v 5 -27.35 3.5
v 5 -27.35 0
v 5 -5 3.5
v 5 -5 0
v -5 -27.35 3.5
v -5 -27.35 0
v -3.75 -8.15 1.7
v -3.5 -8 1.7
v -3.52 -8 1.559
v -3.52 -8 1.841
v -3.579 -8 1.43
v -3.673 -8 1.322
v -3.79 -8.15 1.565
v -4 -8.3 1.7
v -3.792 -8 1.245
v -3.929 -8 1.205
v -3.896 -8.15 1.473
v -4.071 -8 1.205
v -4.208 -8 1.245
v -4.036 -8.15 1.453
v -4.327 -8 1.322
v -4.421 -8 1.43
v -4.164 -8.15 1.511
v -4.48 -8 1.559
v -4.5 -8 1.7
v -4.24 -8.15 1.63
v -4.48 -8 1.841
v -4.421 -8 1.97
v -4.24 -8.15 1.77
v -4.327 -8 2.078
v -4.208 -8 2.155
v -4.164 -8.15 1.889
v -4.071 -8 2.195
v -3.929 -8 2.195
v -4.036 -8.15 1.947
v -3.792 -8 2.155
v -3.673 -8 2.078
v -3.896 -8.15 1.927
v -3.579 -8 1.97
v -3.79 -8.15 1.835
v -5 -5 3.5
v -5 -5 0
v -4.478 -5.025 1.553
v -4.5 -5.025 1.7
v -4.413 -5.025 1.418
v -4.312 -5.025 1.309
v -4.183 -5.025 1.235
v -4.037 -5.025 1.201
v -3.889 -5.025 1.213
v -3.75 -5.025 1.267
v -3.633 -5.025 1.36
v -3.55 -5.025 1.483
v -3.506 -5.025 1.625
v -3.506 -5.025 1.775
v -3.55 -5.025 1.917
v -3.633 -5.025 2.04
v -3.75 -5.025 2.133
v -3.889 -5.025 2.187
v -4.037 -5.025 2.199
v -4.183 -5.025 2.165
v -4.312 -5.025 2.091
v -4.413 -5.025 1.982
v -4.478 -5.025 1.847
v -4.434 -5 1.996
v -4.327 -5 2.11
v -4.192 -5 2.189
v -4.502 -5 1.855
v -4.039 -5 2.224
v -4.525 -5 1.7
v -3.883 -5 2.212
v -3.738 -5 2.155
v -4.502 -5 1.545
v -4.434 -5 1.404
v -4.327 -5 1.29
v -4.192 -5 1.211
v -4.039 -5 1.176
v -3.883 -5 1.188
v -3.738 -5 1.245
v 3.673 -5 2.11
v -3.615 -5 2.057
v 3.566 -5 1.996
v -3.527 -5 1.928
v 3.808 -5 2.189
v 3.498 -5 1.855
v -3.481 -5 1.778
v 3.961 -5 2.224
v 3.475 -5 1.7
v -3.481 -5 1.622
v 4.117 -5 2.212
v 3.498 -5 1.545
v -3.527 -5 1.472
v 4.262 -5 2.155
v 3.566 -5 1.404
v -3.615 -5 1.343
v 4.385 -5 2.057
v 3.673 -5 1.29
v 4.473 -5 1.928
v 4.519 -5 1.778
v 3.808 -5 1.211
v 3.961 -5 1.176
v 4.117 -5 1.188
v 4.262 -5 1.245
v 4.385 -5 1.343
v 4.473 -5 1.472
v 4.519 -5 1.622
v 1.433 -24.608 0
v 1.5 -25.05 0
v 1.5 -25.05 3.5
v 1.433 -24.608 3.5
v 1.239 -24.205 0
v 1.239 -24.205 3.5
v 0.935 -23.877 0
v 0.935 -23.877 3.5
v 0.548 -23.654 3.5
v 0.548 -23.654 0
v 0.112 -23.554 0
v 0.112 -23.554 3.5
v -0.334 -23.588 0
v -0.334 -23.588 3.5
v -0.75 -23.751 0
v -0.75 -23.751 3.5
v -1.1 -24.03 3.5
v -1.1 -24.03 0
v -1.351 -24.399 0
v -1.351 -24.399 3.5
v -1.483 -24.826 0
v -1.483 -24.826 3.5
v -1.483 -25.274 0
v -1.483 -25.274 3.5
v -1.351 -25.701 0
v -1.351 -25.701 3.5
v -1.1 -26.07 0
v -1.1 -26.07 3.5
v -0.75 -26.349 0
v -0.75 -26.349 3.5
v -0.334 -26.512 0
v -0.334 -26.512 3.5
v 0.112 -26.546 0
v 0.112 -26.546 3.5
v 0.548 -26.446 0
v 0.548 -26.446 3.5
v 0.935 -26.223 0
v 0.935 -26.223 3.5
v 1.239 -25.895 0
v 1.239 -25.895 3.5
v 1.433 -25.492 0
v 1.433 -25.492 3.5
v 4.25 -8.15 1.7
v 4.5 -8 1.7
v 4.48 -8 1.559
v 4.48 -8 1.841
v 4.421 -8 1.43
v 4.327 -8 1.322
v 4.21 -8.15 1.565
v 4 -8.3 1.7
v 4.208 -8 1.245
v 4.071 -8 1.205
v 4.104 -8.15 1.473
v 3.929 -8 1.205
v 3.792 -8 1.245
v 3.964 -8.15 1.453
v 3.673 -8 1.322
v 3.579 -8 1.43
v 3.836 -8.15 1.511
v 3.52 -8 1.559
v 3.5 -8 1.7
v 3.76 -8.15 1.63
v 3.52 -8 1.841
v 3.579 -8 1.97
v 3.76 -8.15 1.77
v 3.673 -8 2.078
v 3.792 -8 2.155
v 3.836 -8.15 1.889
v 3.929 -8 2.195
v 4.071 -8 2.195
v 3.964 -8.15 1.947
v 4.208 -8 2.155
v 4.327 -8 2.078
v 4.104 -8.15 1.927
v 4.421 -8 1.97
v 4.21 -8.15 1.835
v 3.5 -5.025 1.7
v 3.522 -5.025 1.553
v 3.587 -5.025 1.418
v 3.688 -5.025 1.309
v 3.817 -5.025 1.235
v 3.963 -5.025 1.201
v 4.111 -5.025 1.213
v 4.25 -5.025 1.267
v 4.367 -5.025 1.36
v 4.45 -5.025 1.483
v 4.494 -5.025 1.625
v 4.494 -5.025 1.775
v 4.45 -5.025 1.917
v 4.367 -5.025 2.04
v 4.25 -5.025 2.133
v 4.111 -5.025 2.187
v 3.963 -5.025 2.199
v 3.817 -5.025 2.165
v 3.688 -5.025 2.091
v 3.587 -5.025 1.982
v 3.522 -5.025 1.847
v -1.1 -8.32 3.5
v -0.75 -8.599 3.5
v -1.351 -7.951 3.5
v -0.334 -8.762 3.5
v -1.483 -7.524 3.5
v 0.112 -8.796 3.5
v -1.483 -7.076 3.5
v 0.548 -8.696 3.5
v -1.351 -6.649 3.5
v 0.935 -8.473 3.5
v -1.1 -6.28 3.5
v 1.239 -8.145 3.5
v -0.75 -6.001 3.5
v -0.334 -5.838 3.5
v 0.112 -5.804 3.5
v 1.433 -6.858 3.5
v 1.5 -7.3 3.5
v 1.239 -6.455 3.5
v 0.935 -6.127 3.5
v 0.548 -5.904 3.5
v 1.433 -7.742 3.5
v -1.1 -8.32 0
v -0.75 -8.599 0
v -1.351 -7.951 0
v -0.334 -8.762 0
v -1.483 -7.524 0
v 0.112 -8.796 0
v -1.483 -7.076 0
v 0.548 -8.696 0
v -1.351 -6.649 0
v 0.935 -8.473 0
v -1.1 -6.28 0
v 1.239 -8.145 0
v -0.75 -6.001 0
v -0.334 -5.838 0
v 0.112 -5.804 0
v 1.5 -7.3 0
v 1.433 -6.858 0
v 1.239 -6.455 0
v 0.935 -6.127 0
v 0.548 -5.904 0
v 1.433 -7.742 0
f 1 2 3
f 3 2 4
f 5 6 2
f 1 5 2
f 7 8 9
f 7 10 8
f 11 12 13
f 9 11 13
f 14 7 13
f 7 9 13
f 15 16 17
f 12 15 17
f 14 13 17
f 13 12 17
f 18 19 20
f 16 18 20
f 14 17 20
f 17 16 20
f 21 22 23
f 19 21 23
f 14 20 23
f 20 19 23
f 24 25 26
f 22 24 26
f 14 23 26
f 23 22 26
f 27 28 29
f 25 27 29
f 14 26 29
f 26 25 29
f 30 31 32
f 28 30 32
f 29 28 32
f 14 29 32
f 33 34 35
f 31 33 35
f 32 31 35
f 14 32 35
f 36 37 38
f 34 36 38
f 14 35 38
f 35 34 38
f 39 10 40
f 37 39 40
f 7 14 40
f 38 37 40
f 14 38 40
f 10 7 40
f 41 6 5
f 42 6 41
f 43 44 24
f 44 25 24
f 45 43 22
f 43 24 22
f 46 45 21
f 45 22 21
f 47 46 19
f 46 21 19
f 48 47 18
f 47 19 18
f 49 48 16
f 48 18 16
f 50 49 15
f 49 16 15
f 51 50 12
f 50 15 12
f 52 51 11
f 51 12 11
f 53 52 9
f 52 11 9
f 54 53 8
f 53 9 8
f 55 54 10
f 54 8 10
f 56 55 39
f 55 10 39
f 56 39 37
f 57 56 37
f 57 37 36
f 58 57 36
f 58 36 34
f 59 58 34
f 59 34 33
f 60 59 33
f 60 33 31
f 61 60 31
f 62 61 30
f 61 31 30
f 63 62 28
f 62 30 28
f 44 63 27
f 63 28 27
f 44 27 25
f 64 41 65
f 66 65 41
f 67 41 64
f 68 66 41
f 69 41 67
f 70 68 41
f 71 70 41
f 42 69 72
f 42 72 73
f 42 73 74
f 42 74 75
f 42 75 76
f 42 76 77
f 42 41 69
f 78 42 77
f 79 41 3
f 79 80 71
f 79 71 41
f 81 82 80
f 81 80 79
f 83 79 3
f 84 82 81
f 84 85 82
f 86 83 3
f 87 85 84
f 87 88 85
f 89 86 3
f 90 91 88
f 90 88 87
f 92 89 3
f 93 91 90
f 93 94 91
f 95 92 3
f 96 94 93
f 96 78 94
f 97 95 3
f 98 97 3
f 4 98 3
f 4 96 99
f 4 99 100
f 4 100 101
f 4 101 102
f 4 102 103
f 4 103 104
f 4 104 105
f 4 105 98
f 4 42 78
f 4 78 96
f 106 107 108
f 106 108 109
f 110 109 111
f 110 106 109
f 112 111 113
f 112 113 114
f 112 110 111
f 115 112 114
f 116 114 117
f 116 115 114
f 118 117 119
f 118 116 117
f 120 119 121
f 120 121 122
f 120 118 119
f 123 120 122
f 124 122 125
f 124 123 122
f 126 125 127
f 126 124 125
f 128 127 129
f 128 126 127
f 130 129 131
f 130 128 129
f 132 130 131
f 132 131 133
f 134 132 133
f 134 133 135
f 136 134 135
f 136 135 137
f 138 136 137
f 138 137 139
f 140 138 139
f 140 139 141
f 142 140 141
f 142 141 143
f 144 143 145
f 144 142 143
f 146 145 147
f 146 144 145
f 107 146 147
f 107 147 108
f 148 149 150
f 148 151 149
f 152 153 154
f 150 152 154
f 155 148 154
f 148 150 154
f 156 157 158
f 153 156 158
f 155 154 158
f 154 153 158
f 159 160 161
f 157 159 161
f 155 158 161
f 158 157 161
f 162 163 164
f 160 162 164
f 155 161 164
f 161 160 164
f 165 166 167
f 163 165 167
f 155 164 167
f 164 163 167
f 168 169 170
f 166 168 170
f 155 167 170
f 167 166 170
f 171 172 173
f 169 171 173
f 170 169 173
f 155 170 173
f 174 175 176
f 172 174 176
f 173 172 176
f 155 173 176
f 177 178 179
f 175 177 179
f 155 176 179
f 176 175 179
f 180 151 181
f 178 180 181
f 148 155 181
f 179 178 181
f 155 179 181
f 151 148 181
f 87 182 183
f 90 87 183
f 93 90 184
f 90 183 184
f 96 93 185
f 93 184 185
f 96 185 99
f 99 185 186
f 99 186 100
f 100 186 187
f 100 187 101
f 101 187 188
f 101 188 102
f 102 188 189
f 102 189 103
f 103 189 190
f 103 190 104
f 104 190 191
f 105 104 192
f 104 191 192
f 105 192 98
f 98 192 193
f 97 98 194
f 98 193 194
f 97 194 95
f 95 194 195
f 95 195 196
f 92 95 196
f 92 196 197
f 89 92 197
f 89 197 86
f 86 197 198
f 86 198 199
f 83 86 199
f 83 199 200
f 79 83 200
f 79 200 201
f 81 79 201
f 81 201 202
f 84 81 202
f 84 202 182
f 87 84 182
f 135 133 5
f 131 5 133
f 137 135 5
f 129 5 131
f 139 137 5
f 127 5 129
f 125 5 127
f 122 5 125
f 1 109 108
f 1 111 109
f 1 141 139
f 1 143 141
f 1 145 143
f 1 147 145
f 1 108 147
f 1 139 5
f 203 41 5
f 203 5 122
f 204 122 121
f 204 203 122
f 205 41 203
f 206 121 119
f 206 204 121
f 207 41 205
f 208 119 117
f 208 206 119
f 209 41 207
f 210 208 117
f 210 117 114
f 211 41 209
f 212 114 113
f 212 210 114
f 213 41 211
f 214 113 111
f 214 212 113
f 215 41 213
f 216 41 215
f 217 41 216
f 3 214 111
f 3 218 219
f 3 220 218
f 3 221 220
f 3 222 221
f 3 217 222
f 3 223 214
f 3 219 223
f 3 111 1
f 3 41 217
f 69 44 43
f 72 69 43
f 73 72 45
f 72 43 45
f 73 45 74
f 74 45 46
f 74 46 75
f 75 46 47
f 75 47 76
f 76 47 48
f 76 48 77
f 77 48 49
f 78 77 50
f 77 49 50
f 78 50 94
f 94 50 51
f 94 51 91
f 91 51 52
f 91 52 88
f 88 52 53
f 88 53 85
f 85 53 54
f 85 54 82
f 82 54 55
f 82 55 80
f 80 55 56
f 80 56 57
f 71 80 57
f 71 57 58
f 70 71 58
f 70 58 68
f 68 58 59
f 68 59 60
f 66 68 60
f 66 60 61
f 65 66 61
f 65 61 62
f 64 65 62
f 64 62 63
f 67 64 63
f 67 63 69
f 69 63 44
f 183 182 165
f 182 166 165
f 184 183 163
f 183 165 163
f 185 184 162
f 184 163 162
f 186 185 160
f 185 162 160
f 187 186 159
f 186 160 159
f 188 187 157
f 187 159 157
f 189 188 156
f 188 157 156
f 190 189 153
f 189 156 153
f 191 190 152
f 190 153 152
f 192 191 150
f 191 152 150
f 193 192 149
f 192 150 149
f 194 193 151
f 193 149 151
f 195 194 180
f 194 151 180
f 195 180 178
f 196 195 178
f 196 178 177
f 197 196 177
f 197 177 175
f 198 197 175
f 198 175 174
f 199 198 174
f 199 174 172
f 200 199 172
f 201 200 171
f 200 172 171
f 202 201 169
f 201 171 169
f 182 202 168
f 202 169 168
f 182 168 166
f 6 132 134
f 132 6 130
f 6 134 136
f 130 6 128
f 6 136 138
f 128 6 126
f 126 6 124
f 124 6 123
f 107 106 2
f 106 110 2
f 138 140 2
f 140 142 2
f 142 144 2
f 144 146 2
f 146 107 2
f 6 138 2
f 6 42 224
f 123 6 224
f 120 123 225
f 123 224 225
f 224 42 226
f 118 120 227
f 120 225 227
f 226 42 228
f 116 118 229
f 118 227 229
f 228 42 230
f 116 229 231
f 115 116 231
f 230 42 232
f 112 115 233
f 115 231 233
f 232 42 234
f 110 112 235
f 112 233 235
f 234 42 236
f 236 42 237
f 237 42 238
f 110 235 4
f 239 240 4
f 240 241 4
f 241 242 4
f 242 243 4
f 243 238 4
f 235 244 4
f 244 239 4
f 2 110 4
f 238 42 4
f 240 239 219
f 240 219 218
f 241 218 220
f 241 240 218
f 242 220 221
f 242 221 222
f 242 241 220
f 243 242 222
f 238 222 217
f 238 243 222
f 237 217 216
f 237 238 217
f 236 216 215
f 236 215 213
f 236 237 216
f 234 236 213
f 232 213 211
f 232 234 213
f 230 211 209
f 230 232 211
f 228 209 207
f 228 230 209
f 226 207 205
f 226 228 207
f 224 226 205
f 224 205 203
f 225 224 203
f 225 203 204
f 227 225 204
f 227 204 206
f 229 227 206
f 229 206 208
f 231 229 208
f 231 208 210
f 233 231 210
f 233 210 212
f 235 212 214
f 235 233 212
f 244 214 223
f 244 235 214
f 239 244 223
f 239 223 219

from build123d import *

# Parameters (mm, degrees)
SKETCH2_W                       = 10
SKETCH2_H                       = 22.35
SKETCH2_R                       = 1.5
BOSS_EXTRUDE1_DEPTH             = 3.5
F_1_0MM_DOWEL_HOLE1_D           = 1
F_1_0MM_DOWEL_HOLE1_DEPTH       = 3
F_1_0MM_DOWEL_HOLE1_CSINK_D     = 1.05
F_1_0MM_DOWEL_HOLE1_CSINK_ANGLE = 90
F_1_0MM_DOWEL_HOLE1_TIP         = 0.30043031


with BuildPart() as part:
    # Sketch2 → Boss-Extrude1 (new body)
    with BuildSketch(Plane.XY):
        with Locations((0, -16.175)):
            Rectangle(SKETCH2_W, SKETCH2_H)
        with Locations((0, -7.3)):
            Circle(SKETCH2_R, mode=Mode.SUBTRACT)
        with Locations((0, -25.05)):
            Circle(SKETCH2_R, mode=Mode.SUBTRACT)
    extrude(amount=BOSS_EXTRUDE1_DEPTH)

    # Ø1.0mm Dowel Hole1
    with Locations(Plane(origin=(-4, -5, 1.7), x_dir=(1, 0, 0), z_dir=(0, 1, 0))):
        with Locations((0, 0), (8, 0)):
            CounterSinkHole(F_1_0MM_DOWEL_HOLE1_D / 2, F_1_0MM_DOWEL_HOLE1_CSINK_D / 2, depth=F_1_0MM_DOWEL_HOLE1_DEPTH, counter_sink_angle=F_1_0MM_DOWEL_HOLE1_CSINK_ANGLE)
            with Locations((0, 0, -(F_1_0MM_DOWEL_HOLE1_DEPTH + F_1_0MM_DOWEL_HOLE1_TIP / 2))):  # 118° drill point
                Cone(0, F_1_0MM_DOWEL_HOLE1_D / 2, F_1_0MM_DOWEL_HOLE1_TIP, mode=Mode.SUBTRACT)


solid = part.part
